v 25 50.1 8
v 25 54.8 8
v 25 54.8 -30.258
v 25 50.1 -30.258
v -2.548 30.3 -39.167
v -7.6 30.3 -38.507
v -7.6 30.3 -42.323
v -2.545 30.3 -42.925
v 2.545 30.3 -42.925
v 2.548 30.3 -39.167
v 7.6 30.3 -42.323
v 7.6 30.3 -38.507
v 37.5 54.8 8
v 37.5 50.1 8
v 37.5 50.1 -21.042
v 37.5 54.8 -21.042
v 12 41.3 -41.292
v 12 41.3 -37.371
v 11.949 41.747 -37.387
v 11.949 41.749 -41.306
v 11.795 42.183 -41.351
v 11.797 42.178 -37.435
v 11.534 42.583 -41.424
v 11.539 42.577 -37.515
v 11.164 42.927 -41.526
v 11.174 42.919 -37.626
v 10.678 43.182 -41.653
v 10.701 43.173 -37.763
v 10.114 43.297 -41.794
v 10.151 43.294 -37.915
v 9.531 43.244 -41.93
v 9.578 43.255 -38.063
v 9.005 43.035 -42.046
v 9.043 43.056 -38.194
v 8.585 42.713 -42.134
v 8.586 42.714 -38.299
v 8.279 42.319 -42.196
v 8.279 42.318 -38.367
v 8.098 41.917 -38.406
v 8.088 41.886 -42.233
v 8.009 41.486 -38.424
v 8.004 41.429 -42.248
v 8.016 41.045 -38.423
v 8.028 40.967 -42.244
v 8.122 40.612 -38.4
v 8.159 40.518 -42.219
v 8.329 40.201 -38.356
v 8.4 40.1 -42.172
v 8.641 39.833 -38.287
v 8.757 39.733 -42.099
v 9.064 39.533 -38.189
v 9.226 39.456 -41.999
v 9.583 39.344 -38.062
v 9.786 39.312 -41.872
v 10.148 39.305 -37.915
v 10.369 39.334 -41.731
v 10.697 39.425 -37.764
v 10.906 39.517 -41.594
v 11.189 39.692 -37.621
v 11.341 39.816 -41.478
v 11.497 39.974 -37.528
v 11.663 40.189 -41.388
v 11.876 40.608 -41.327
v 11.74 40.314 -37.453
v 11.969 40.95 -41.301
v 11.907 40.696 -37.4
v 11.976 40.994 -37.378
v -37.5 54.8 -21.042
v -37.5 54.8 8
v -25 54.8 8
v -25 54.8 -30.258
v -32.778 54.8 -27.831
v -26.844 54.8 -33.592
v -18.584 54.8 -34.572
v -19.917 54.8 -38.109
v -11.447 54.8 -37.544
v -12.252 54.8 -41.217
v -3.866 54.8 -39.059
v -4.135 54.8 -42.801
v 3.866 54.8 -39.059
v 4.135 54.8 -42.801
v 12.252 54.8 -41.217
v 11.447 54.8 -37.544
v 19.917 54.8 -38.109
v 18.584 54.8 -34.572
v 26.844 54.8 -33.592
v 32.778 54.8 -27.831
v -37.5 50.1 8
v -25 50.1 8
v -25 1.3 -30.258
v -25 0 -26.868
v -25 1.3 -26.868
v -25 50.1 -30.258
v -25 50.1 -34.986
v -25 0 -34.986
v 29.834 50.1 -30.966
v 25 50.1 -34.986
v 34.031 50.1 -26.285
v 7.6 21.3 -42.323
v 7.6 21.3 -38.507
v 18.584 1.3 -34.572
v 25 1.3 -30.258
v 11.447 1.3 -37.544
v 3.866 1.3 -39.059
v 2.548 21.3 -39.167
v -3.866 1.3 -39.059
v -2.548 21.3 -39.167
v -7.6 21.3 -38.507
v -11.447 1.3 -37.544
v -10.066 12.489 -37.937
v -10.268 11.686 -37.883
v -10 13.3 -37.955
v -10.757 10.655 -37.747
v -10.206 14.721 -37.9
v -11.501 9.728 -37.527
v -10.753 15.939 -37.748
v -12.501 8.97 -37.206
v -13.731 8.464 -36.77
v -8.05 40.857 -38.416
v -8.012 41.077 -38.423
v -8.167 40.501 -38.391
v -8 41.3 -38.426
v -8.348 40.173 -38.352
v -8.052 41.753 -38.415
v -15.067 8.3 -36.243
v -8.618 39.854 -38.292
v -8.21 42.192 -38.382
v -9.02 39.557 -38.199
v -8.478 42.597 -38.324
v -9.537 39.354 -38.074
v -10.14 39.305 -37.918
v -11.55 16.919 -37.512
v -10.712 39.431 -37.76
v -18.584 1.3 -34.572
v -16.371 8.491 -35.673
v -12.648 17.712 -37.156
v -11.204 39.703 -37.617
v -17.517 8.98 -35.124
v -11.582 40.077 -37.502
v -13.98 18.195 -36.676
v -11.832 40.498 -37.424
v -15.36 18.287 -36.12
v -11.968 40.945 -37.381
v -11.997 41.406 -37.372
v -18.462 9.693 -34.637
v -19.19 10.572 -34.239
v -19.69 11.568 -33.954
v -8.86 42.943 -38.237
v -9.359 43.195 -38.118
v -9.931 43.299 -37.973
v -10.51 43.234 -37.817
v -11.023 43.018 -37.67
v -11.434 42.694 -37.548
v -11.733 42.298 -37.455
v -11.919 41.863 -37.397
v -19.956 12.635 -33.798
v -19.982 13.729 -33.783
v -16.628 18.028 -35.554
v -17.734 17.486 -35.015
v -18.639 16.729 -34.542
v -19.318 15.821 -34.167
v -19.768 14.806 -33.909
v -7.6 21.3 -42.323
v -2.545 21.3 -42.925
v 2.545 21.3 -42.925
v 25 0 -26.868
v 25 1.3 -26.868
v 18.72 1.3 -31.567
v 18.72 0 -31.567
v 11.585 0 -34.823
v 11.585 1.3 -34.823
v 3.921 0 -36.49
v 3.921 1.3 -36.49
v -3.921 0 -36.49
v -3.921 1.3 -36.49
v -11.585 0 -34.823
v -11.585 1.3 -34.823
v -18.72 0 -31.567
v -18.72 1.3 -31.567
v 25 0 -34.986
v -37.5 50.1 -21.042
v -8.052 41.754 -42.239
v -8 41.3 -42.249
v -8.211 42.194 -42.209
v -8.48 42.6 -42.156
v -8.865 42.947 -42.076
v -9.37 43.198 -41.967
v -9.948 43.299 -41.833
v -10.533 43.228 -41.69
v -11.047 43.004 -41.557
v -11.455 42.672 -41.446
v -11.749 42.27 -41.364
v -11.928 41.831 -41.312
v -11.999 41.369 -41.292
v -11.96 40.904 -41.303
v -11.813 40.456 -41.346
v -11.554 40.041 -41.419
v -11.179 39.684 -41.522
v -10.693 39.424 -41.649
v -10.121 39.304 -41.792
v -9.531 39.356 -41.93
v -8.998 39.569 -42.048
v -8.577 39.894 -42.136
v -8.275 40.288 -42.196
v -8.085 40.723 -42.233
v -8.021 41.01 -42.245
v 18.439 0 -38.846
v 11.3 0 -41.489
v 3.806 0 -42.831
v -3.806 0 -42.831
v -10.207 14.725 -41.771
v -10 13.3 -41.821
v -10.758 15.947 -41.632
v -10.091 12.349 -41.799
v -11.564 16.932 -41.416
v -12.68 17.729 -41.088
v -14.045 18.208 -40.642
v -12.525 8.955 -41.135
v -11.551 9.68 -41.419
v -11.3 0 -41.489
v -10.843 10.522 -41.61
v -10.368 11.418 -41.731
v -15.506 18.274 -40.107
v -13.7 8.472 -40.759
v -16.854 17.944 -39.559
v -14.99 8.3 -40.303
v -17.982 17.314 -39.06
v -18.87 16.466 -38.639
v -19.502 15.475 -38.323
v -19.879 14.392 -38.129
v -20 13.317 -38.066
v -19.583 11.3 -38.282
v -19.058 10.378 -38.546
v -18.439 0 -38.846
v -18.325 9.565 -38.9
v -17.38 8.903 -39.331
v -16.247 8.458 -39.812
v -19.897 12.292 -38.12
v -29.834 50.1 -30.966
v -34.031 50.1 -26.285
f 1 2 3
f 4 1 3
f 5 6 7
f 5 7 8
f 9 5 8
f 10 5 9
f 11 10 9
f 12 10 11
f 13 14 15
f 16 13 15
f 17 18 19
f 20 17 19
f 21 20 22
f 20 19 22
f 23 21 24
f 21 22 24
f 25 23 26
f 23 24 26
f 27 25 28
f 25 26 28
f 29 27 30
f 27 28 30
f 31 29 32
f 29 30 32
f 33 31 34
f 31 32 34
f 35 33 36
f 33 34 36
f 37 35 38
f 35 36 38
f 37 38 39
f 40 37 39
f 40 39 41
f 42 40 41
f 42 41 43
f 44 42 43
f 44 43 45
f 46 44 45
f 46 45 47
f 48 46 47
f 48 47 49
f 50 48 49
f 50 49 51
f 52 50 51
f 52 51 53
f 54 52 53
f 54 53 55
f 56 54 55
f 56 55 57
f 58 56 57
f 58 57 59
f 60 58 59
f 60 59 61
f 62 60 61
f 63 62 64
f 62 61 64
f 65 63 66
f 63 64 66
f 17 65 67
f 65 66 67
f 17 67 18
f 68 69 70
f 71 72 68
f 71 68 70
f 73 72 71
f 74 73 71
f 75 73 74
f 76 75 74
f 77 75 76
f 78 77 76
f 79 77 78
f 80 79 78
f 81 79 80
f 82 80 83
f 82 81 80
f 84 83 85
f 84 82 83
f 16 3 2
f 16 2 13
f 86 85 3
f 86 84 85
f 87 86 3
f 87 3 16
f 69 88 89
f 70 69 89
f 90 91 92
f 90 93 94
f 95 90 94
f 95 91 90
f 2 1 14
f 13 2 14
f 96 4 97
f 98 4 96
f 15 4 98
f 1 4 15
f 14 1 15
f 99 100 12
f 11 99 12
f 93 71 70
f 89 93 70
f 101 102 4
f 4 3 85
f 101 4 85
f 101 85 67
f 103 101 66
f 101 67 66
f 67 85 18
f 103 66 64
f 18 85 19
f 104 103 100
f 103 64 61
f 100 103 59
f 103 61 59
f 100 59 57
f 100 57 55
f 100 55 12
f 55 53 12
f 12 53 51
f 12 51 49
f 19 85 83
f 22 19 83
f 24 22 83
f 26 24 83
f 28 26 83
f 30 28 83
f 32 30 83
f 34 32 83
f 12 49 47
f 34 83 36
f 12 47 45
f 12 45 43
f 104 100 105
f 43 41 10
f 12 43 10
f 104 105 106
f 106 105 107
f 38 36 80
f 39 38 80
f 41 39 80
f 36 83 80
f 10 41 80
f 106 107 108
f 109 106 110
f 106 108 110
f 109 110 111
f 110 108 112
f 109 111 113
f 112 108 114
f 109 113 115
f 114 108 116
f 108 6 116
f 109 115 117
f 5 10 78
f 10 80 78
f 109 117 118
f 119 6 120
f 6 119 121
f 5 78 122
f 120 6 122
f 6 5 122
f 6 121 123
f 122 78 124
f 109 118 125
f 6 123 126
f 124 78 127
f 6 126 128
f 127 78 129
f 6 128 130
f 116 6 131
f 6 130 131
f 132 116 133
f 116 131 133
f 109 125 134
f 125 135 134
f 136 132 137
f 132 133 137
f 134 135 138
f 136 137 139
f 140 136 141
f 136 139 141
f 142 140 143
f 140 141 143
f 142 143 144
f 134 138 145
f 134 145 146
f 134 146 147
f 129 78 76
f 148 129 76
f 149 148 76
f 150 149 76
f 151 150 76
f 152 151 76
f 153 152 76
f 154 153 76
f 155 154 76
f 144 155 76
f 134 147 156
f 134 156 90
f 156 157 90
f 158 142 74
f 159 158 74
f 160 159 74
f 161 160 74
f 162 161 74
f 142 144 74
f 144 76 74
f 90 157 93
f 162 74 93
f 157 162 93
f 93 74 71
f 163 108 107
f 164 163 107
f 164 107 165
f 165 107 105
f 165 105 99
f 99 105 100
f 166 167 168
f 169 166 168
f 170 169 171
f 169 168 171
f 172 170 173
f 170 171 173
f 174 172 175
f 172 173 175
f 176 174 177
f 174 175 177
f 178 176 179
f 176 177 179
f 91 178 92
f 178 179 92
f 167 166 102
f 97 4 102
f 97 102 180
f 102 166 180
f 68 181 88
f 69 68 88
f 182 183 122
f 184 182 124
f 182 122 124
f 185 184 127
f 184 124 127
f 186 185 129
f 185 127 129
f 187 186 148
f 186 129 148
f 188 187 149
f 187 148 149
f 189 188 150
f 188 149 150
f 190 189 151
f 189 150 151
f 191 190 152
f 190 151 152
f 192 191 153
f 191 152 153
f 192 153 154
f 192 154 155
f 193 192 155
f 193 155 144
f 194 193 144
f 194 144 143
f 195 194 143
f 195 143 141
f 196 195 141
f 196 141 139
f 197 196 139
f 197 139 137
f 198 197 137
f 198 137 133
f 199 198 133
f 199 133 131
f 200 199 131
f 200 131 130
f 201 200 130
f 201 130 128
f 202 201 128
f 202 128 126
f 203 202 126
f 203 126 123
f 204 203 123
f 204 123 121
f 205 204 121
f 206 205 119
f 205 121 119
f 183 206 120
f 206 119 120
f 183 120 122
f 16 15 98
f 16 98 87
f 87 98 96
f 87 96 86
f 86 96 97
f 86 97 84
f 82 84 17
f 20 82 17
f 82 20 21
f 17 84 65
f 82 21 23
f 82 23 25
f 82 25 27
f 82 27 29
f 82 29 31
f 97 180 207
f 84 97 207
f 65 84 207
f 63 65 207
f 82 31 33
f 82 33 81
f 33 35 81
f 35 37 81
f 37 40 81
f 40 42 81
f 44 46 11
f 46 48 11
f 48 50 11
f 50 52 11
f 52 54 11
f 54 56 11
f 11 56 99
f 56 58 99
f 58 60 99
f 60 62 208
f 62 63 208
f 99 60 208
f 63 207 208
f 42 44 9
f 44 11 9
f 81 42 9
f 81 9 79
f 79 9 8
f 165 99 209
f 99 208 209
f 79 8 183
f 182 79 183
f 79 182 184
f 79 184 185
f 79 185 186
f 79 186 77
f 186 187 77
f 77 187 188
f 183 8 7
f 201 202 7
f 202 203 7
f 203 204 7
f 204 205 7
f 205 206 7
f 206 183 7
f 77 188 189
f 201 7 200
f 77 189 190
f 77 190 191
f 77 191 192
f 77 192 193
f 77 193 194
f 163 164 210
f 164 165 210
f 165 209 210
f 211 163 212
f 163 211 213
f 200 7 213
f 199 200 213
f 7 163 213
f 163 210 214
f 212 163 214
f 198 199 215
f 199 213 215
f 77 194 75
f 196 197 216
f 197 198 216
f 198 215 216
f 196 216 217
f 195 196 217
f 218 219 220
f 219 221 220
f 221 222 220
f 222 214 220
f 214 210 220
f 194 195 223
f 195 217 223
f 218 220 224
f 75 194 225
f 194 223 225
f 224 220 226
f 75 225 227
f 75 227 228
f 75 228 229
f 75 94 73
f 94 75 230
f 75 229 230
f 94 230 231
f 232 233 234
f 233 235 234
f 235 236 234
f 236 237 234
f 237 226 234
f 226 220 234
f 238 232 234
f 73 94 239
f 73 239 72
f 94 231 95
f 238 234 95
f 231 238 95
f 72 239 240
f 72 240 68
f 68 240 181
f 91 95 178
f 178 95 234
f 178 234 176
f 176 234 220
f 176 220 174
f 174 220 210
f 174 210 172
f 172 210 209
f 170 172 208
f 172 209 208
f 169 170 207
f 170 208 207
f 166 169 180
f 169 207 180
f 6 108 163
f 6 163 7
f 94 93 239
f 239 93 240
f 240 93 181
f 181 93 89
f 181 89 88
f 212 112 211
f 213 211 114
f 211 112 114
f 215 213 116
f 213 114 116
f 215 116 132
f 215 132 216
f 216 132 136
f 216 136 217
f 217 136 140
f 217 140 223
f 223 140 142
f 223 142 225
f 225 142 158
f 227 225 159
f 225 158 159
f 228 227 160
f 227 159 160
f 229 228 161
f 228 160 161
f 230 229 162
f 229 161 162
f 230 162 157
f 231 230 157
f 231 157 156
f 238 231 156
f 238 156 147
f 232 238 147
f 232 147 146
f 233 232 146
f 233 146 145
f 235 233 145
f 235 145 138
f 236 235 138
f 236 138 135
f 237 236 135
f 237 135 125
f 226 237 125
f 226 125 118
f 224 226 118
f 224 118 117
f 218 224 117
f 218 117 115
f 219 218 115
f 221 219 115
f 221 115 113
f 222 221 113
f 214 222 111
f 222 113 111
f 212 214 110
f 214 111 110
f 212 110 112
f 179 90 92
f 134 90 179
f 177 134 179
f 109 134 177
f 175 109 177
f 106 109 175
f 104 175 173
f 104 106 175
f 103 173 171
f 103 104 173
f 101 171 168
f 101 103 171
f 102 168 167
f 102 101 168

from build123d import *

# Parameters (mm, degrees)
BOSS_EXTRUDE1_DEPTH = 54.8
CUT_EXTRUDE1_DEPTH  = 53.5
CUT_EXTRUDE2_DEPTH  = 50.1
CUT_EXTRUDE4_REACH  = 53
SKETCH5_R           = 2
SKETCH5_R_2         = 5
SKETCH5_W           = 15.2
SKETCH5_H           = 9
SKETCH6_R           = 36.7
CUT_EXTRUDE5_DEPTH  = 10


with BuildPart() as part:
    # Sketch2 → Boss-Extrude1 (new body)
    with BuildSketch(Plane(origin=(0, 0, 0), x_dir=(1, 0, 0), z_dir=(0, 1, 0))):
        with BuildLine():
            Line((-37.5, 21.041625413), (-37.5, -8))
            Line((-37.5, -8), (37.5, -8))
            Line((37.5, -8), (37.5, 21.041625413))
            ThreePointArc((37.5, 21.041625413), (0, 43), (-37.5, 21.041625413))
        make_face()
    extrude(amount=BOSS_EXTRUDE1_DEPTH)

    # Sketch3 → Cut-Extrude1 (cut)
    with BuildSketch(Plane(origin=(0, 54.8, 0), x_dir=(1, 0, 0), z_dir=(0, 1, 0))):
        with BuildLine():
            Line((-25, 30.258263334), (-25, -8))
            Line((-25, -8), (25, -8))
            Line((25, -8), (25, 30.258263334))
            ThreePointArc((25, 30.258263334), (0, 39.25), (-25, 30.258263334))
        make_face()
    extrude(amount=-CUT_EXTRUDE1_DEPTH, mode=Mode.SUBTRACT)

    # Sketch4 → Cut-Extrude2 (cut)
    with BuildSketch(Plane.XZ):
        with BuildLine():
            Line((25, 8), (25, -34.985711369))
            ThreePointArc((25, -34.985711369), (32.018305441, -28.702406114), (37.5, -21.041625413))
            Line((37.5, -21.041625413), (37.5, 8))
            Line((37.5, 8), (25, 8))
        make_face()
        with BuildLine():
            Line((-25, 8), (-25, -34.985711369))
            ThreePointArc((-25, -34.985711369), (-32.018305441, -28.702406114), (-37.5, -21.041625413))
            Line((-37.5, -21.041625413), (-37.5, 8))
            Line((-37.5, 8), (-25, 8))
        make_face()
    extrude(amount=-CUT_EXTRUDE2_DEPTH, mode=Mode.SUBTRACT)

    # Sketch5 → Cut-Extrude4 (cut, up to next)
    with BuildSketch(Plane.XY.offset(8), mode=Mode.PRIVATE) as cut_extrude4_sk1:
        with Locations((-10, 41.3)):
            Circle(SKETCH5_R)
    cut_extrude4_tool1 = extrude(cut_extrude4_sk1.sketch, amount=-CUT_EXTRUDE4_REACH, mode=Mode.PRIVATE) & part.part
    add(cut_extrude4_tool1.solids().sort_by_distance((-10, 41.3, 8))[0], mode=Mode.SUBTRACT)
    # Sketch5 → Cut-Extrude4 (cut, up to next)
    with BuildSketch(Plane.XY.offset(8), mode=Mode.PRIVATE) as cut_extrude4_sk2:
        with Locations((10, 41.3)):
            Circle(SKETCH5_R)
    cut_extrude4_tool2 = extrude(cut_extrude4_sk2.sketch, amount=-CUT_EXTRUDE4_REACH, mode=Mode.PRIVATE) & part.part
    add(cut_extrude4_tool2.solids().sort_by_distance((10, 41.3, 8))[0], mode=Mode.SUBTRACT)
    # Sketch5 → Cut-Extrude4 (cut, up to next)
    with BuildSketch(Plane.XY.offset(8), mode=Mode.PRIVATE) as cut_extrude4_sk3:
        with Locations((-15, 13.3)):
            Circle(SKETCH5_R_2)
    cut_extrude4_tool3 = extrude(cut_extrude4_sk3.sketch, amount=-CUT_EXTRUDE4_REACH, mode=Mode.PRIVATE) & part.part
    add(cut_extrude4_tool3.solids().sort_by_distance((-15, 13.3, 8))[0], mode=Mode.SUBTRACT)
    # Sketch5 → Cut-Extrude4 (cut, up to next)
    with BuildSketch(Plane.XY.offset(8), mode=Mode.PRIVATE) as cut_extrude4_sk4:
        with Locations((0, 25.8)):
            Rectangle(SKETCH5_W, SKETCH5_H)
    cut_extrude4_tool4 = extrude(cut_extrude4_sk4.sketch, amount=-CUT_EXTRUDE4_REACH, mode=Mode.PRIVATE) & part.part
    add(cut_extrude4_tool4.solids().sort_by_distance((0, 25.8, 8))[0], mode=Mode.SUBTRACT)

    # Sketch6 → Cut-Extrude5 (cut)
    with BuildSketch(Plane(origin=(0, 1.3, 0), x_dir=(1, 0, 0), z_dir=(0, 1, 0))):
        Circle(SKETCH6_R)
    extrude(amount=-CUT_EXTRUDE5_DEPTH, mode=Mode.SUBTRACT)


solid = part.part
